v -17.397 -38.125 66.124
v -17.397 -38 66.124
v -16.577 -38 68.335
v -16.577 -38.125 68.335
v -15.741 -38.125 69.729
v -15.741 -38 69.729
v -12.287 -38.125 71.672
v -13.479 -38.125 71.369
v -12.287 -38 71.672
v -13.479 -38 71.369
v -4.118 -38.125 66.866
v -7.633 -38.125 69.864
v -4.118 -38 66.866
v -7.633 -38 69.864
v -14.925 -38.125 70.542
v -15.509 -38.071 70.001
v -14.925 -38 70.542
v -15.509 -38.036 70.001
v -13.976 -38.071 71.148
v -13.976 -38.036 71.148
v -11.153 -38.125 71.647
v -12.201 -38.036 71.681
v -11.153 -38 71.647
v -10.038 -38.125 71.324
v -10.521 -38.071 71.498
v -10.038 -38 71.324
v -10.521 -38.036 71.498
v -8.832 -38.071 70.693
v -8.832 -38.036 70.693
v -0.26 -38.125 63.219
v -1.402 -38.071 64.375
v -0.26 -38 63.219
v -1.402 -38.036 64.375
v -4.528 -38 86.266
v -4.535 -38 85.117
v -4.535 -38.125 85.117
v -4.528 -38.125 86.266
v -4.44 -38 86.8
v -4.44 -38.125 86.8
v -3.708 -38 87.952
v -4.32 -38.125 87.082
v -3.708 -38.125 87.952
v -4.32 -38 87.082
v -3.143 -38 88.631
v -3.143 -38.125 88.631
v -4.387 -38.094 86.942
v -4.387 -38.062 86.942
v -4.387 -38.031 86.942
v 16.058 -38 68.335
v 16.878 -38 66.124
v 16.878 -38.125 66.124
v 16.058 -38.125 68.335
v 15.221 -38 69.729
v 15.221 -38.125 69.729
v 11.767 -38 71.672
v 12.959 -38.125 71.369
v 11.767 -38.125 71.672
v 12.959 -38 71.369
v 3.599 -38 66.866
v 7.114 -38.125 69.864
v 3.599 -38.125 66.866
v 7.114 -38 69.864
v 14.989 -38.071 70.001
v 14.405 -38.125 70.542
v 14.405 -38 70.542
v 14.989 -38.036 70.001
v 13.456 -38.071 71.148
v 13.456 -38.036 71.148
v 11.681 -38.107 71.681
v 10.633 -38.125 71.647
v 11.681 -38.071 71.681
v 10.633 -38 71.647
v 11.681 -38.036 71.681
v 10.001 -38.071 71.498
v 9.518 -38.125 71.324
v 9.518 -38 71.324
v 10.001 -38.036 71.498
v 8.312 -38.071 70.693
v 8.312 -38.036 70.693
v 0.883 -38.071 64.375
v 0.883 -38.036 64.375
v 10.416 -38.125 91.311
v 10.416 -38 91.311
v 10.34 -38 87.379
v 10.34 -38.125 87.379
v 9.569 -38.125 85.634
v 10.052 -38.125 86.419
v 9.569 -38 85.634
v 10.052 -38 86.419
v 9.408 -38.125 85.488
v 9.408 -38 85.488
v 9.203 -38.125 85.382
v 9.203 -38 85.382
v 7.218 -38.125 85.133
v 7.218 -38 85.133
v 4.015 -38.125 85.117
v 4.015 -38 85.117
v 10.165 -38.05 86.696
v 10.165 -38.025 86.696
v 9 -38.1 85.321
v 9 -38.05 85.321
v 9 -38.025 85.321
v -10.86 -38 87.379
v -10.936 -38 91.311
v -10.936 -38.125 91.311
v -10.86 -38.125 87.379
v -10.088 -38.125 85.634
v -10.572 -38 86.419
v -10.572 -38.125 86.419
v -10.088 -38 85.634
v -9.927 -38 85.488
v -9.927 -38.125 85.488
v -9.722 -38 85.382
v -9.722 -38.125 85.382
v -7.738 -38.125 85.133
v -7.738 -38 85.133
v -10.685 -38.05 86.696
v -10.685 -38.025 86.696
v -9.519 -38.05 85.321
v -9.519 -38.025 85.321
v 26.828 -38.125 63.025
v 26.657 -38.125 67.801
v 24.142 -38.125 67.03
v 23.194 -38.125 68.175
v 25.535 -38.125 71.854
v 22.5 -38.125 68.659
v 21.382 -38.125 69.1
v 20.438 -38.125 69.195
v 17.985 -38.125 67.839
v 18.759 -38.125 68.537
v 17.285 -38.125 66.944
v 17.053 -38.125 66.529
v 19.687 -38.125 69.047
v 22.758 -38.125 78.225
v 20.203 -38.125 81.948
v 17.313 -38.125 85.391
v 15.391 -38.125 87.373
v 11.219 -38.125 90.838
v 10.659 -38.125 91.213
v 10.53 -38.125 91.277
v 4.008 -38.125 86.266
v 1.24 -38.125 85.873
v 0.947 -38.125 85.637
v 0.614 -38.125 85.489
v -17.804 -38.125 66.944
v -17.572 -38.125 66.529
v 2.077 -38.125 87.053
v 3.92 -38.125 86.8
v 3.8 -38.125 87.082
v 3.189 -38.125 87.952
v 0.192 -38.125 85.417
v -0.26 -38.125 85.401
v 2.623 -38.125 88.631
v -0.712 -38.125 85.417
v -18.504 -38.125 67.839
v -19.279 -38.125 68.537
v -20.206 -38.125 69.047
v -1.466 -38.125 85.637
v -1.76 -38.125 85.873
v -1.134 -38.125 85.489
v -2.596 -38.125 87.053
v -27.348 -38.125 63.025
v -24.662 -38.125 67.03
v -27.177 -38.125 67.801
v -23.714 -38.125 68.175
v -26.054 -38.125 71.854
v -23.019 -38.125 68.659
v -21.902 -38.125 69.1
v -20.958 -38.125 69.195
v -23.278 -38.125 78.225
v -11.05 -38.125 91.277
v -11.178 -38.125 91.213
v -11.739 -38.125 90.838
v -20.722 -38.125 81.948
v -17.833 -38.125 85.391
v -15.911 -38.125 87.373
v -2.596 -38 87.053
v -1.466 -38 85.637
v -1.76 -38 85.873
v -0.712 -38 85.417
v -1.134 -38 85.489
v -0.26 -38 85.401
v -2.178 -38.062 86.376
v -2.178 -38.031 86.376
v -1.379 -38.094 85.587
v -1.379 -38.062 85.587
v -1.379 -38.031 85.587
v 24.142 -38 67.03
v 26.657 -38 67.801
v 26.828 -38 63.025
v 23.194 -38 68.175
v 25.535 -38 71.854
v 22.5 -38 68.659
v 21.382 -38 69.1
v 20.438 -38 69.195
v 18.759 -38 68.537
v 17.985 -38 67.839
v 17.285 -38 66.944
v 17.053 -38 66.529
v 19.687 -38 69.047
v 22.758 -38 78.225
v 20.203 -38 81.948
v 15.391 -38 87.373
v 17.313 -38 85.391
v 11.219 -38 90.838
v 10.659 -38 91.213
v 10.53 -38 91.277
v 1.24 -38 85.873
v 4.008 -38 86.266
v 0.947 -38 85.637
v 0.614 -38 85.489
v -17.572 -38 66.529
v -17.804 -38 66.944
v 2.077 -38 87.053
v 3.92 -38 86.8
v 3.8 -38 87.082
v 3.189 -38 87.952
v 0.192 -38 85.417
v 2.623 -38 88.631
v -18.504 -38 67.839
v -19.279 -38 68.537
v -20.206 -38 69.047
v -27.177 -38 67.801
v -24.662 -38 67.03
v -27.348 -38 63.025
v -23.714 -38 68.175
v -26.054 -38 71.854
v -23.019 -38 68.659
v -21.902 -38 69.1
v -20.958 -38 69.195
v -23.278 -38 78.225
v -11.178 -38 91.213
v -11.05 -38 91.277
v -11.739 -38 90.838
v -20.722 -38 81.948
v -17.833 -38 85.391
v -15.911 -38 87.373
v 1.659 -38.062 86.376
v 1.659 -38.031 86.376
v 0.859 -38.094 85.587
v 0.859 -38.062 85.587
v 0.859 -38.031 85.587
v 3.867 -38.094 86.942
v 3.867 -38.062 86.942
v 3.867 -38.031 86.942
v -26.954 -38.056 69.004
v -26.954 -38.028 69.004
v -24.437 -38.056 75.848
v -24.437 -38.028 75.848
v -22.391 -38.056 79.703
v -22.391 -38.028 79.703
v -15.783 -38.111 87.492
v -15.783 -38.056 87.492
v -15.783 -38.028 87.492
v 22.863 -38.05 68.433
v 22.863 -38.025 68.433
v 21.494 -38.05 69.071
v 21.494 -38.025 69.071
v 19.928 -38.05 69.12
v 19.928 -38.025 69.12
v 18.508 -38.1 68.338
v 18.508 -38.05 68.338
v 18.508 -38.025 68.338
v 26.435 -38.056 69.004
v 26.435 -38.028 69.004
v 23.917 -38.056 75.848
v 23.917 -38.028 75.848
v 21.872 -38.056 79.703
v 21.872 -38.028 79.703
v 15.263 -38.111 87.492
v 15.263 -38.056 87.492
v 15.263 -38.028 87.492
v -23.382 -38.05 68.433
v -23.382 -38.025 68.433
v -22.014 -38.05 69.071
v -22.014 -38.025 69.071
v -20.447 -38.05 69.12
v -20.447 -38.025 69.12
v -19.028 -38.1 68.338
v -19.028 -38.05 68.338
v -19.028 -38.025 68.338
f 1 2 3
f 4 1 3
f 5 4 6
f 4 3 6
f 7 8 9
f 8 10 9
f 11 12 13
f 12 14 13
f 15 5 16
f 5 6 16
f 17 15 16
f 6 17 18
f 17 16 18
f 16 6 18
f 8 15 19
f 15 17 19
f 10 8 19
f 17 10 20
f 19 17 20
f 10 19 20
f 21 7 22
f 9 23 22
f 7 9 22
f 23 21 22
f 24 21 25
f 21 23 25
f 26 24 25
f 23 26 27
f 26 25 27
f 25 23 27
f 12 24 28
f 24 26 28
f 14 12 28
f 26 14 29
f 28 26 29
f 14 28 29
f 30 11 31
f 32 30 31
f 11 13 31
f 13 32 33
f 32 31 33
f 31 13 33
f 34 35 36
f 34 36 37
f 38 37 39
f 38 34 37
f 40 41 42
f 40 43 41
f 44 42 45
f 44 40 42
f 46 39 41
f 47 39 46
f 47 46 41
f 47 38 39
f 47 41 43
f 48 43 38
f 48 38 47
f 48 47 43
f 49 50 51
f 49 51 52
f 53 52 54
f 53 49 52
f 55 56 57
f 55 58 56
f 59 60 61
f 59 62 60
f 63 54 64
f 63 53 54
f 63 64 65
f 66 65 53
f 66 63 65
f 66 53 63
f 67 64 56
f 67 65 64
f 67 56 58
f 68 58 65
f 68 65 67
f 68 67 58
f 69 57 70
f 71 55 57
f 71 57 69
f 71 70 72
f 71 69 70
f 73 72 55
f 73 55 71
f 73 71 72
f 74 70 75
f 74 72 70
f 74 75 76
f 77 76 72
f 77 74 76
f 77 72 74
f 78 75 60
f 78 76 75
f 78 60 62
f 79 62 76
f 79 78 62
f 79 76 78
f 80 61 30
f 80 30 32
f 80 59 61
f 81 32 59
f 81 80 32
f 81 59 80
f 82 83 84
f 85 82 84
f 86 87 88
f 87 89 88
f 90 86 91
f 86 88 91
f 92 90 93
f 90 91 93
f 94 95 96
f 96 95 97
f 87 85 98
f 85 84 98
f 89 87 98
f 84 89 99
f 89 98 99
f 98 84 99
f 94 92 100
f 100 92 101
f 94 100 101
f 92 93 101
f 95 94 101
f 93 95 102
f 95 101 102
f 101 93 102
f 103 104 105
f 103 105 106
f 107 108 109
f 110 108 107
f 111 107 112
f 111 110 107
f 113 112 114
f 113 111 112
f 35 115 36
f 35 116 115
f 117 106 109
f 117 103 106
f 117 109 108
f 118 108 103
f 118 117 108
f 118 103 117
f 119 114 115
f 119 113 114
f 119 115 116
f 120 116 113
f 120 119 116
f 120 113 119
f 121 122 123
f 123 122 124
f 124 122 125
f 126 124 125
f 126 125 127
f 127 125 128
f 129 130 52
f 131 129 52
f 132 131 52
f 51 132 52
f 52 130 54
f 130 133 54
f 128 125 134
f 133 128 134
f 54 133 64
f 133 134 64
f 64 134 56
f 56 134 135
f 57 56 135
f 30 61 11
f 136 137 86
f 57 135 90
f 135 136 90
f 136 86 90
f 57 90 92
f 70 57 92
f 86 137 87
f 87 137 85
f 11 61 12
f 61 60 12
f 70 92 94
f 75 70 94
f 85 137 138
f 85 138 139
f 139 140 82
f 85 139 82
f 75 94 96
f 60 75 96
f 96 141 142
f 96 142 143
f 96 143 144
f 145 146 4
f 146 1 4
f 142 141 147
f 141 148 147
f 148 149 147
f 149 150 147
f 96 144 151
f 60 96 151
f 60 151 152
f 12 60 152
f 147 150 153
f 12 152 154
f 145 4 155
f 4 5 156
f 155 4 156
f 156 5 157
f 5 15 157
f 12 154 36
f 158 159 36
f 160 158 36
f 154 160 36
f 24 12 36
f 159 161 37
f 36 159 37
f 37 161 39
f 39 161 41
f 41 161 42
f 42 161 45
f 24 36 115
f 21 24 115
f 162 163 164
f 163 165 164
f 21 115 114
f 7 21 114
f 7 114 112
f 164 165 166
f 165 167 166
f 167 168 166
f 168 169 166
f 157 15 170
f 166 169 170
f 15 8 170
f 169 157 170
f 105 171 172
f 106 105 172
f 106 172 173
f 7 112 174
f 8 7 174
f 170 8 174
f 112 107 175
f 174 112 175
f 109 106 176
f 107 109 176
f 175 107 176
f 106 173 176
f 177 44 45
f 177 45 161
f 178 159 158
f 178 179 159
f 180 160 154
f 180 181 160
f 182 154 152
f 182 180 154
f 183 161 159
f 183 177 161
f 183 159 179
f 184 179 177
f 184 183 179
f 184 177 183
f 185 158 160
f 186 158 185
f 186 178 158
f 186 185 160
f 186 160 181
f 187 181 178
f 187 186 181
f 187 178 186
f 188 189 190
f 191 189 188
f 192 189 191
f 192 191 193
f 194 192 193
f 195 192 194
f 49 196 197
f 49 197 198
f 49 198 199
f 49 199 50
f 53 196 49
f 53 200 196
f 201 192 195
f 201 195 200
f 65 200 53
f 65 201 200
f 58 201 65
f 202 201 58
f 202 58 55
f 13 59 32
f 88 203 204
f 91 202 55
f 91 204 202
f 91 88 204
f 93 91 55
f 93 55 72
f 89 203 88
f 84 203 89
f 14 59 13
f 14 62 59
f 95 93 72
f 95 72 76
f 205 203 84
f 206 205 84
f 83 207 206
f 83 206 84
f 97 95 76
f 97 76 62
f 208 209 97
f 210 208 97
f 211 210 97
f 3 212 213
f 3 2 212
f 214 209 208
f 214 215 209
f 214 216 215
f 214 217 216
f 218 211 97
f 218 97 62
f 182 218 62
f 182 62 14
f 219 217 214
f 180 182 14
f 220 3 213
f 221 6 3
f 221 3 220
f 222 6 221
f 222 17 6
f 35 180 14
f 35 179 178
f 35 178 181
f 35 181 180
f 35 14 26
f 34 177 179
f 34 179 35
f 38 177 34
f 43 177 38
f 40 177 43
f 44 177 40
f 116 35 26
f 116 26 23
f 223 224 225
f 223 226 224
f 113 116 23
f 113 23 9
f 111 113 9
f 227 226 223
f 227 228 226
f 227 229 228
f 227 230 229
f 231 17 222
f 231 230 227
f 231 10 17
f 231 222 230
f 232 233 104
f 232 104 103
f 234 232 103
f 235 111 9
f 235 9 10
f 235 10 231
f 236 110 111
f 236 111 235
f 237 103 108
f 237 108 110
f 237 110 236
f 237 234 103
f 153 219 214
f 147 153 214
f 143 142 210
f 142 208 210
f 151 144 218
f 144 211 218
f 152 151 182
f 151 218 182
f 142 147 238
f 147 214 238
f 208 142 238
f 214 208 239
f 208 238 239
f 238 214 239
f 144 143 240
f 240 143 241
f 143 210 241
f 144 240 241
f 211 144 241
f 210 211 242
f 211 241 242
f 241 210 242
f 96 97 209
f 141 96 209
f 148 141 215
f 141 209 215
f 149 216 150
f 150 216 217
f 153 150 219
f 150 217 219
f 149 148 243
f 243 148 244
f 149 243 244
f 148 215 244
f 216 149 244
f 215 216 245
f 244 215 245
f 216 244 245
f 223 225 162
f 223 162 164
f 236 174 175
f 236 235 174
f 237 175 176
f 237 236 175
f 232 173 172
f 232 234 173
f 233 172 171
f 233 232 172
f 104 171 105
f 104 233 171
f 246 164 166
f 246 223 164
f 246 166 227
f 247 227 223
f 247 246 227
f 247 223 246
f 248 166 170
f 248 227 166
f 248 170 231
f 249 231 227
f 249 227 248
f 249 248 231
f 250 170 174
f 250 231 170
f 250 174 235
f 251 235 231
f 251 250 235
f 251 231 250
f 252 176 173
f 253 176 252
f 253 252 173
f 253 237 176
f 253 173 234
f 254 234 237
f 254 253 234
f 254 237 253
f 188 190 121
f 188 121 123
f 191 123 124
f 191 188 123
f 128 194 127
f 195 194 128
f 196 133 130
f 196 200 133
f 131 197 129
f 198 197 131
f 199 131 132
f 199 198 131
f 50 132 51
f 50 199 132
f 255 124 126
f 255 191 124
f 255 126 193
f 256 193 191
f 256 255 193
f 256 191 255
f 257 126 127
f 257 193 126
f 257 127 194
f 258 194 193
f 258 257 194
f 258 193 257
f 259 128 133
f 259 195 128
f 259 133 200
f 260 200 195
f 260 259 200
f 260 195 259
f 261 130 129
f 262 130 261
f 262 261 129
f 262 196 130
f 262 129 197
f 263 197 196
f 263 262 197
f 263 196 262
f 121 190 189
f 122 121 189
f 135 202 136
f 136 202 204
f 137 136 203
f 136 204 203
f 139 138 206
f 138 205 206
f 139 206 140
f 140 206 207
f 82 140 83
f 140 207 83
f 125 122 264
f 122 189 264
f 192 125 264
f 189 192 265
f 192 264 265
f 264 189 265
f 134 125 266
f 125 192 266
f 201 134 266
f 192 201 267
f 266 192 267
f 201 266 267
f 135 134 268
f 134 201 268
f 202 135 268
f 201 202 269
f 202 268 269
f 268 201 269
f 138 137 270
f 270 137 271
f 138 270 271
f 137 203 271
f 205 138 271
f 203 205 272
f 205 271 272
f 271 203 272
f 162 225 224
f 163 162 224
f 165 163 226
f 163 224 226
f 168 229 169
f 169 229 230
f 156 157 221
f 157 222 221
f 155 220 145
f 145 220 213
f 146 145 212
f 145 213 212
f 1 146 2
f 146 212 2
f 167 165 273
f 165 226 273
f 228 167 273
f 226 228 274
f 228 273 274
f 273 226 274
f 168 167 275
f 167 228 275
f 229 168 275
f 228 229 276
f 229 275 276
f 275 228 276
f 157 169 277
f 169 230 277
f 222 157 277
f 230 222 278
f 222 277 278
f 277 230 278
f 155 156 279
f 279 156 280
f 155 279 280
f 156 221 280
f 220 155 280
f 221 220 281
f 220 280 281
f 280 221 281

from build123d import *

# Parameters (mm, degrees)
F2_DEPTH = 0.125


with BuildPart() as f2:
    # F1 (on offset) → F2 (new body)
    with BuildSketch(Plane.XZ.offset(38)):
        with BuildLine():
            add(Edge.make_bspline(
                [(-27.3476754247, 63.0246619321), (-27.3672520646, 63.9576542445), (-27.4075444341, 65.8779261226), (-27.0855132224, 69.0614393357), (-25.8575998649, 72.4270701251), (-24.4658338877, 75.9040444219), (-22.5508546968, 79.8248515279), (-19.193083781, 83.7648022123), (-16.3099442066, 87.3030562237), (-11.357058226, 91.209673657), (-11.0022914003, 91.2954621915), (-10.936129613, 91.311461215)],
                knots=[0, 0, 0, 0, 0.0997388767, 0.205281177, 0.3170669566, 0.4316816553, 0.5554886366, 0.687860813, 0.8234472119, 0.9670740126, 1, 1, 1, 1], degree=3))
            add(Edge.make_bspline(
                [(-27.3476754247, 63.0246619321), (-26.7461043356, 63.7697398475), (-24.9266814731, 66.6222945265), (-23.6740531483, 68.5827168609), (-20.3105548759, 69.7949443253), (-17.9232449602, 67.3104272411), (-17.5430867337, 66.4922923237), (-17.3972456203, 66.1242574452)],
                knots=[0, 0, 0, 0, 0.2478849849, 0.4403978356, 0.6506722668, 0.8629704481, 1, 1, 1, 1], degree=3))
            add(Edge.make_bspline(
                [(-17.3972456203, 66.1242574452), (-17.2350024136, 66.517906582), (-17.0039310916, 67.3569306359), (-15.8055151021, 70.3588419242), (-12.1444260413, 72.1830428426), (-8.6140442847, 70.9184594895), (-4.3135911477, 67.0446091747), (-1.4750071147, 64.475214366), (-0.5934401025, 63.5822325645), (-0.2598327037, 63.2193444188)],
                knots=[0, 0, 0, 0, 0.0912907011, 0.232909175, 0.3889796109, 0.5408065453, 0.7376965869, 0.8967209358, 1, 1, 1, 1], degree=3))
            add(Edge.make_bspline(
                [(16.8775802128, 66.1242574452), (16.7153370061, 66.517906582), (16.4842656842, 67.3569306359), (15.2858496947, 70.3588419242), (11.6247606339, 72.1830428426), (8.0943788773, 70.9184594895), (3.7939257402, 67.0446091747), (0.9553417072, 64.475214366), (0.073774695, 63.5822325645), (-0.2598327037, 63.2193444188)],
                knots=[0, 0, 0, 0, 0.0912907011, 0.232909175, 0.3889796109, 0.5408065453, 0.7376965869, 0.8967209358, 1, 1, 1, 1], degree=3))
            add(Edge.make_bspline(
                [(26.8280100172, 63.0246619321), (26.2264389281, 63.7697398475), (24.4070160656, 66.6222945265), (23.1543877408, 68.5827168609), (19.7908894684, 69.7949443253), (17.4035795527, 67.3104272411), (17.0234213262, 66.4922923237), (16.8775802128, 66.1242574452)],
                knots=[0, 0, 0, 0, 0.2478849849, 0.4403978356, 0.6506722668, 0.8629704481, 1, 1, 1, 1], degree=3))
            add(Edge.make_bspline(
                [(26.8280100172, 63.0246619321), (26.8475866571, 63.9576542445), (26.8878790266, 65.8779261226), (26.565847815, 69.0614393357), (25.3379344574, 72.4270701251), (23.9461684802, 75.9040444219), (22.0311892893, 79.8248515279), (18.6734183735, 83.7648022123), (15.7902787991, 87.3030562237), (10.8373928186, 91.209673657), (10.4826259929, 91.2954621915), (10.4164642055, 91.311461215)],
                knots=[0, 0, 0, 0, 0.0997388767, 0.205281177, 0.3170669566, 0.4316816553, 0.5554886366, 0.687860813, 0.8234472119, 0.9670740126, 1, 1, 1, 1], degree=3))
            add(Edge.make_bspline(
                [(10.4164642055, 91.311461215), (10.4405336164, 90.0597899527), (10.4758761161, 88.2314956633), (10.2698948197, 86.7412943545), (9.6353295808, 85.6177442654), (8.9398253308, 85.1404535683), (6.1055103752, 85.0625351899), (4.0153607385, 85.1169720806)],
                knots=[0, 0, 0, 0, 0.2491831435, 0.4188869753, 0.5695257095, 0.6873049334, 1, 1, 1, 1], degree=3))
            add(Edge.make_bspline(
                [(4.0153607385, 85.1169720806), (4.0286427583, 85.4219670124), (4.0241651373, 86.1248452433), (3.9665321835, 86.9689898545), (3.1777994484, 87.9759379856), (2.8008802274, 88.4223995815), (2.6230341514, 88.6312380985)],
                knots=[0, 0, 0, 0, 0.2513304217, 0.4840638645, 0.7643420388, 1, 1, 1, 1], degree=3))
            add(Edge.make_bspline(
                [(2.6230341514, 88.6312380985), (2.5713023701, 88.2696587841), (2.1996171152, 87.2029859558), (1.6997387803, 86.3959295677), (0.9186607969, 85.4280012054), (0.1468636395, 85.4045778904), (-0.2598327037, 85.4010403242)],
                knots=[0, 0, 0, 0, 0.2759686461, 0.5102049533, 0.7544949989, 1, 1, 1, 1], degree=3))
            add(Edge.make_bspline(
                [(-3.1426995588, 88.6312380985), (-3.0909677775, 88.2696587841), (-2.7192825227, 87.2029859558), (-2.2194041877, 86.3959295677), (-1.4383262044, 85.4280012054), (-0.666529047, 85.4045778904), (-0.2598327037, 85.4010403242)],
                knots=[0, 0, 0, 0, 0.2759686461, 0.5102049533, 0.7544949989, 1, 1, 1, 1], degree=3))
            add(Edge.make_bspline(
                [(-4.5350261459, 85.1169720806), (-4.5483081658, 85.4219670124), (-4.5438305447, 86.1248452433), (-4.486197591, 86.9689898545), (-3.6974648558, 87.9759379856), (-3.3205456349, 88.4223995815), (-3.1426995588, 88.6312380985)],
                knots=[0, 0, 0, 0, 0.2513304217, 0.4840638645, 0.7643420388, 1, 1, 1, 1], degree=3))
            add(Edge.make_bspline(
                [(-10.936129613, 91.311461215), (-10.9601990239, 90.0597899527), (-10.9955415236, 88.2314956633), (-10.7895602271, 86.7412943545), (-10.1549949882, 85.6177442654), (-9.4594907383, 85.1404535683), (-6.6251757827, 85.0625351899), (-4.5350261459, 85.1169720806)],
                knots=[0, 0, 0, 0, 0.2491831435, 0.4188869753, 0.5695257095, 0.6873049334, 1, 1, 1, 1], degree=3))
        make_face()
    extrude(amount=F2_DEPTH)


solid = f2.part
